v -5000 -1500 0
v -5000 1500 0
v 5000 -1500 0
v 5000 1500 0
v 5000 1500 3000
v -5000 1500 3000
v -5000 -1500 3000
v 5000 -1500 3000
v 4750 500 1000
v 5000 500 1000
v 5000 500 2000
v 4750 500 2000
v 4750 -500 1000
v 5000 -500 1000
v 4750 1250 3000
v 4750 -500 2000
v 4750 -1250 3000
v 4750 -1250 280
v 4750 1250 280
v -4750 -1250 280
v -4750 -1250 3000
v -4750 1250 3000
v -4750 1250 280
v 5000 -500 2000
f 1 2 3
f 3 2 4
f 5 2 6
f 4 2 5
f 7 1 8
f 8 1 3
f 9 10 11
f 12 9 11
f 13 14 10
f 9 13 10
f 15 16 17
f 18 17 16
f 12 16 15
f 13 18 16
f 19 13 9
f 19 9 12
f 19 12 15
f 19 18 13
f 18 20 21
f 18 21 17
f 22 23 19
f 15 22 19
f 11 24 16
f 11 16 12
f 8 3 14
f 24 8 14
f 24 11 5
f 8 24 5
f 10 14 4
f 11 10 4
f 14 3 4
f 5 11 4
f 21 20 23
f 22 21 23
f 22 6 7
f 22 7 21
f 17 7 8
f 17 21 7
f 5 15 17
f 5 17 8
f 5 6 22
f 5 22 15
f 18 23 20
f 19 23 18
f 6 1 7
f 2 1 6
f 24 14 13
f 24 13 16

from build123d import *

# Parameters (mm, degrees)
F0_W     = 10000
F0_H     = 3000
F1_DEPTH = 280
F2_W     = 10000
F2_H     = 3000
F2_W_2   = 9500
F2_H_2   = 2500
F3_DEPTH = 3000
F4_W     = 1000
F4_H     = 1000
F5_DEPTH = 1000


with BuildPart() as f1:
    # F0 (on Top) → F1 (new body)
    with BuildSketch(Plane.XY):
        Rectangle(F0_W, F0_H)
    extrude(amount=F1_DEPTH)

    # F2 (on Top) → F3 (join)
    with BuildSketch(Plane.XY):
        Rectangle(F2_W, F2_H)
        Rectangle(F2_W_2, F2_H_2, mode=Mode.SUBTRACT)
    extrude(amount=F3_DEPTH)

    # F4 (on face) → F5 (cut)
    with BuildSketch(Plane.YZ.offset(5000)):
        with Locations((0, 1500)):
            Rectangle(F4_W, F4_H)
    extrude(amount=-F5_DEPTH, mode=Mode.SUBTRACT)


solid = f1.part
